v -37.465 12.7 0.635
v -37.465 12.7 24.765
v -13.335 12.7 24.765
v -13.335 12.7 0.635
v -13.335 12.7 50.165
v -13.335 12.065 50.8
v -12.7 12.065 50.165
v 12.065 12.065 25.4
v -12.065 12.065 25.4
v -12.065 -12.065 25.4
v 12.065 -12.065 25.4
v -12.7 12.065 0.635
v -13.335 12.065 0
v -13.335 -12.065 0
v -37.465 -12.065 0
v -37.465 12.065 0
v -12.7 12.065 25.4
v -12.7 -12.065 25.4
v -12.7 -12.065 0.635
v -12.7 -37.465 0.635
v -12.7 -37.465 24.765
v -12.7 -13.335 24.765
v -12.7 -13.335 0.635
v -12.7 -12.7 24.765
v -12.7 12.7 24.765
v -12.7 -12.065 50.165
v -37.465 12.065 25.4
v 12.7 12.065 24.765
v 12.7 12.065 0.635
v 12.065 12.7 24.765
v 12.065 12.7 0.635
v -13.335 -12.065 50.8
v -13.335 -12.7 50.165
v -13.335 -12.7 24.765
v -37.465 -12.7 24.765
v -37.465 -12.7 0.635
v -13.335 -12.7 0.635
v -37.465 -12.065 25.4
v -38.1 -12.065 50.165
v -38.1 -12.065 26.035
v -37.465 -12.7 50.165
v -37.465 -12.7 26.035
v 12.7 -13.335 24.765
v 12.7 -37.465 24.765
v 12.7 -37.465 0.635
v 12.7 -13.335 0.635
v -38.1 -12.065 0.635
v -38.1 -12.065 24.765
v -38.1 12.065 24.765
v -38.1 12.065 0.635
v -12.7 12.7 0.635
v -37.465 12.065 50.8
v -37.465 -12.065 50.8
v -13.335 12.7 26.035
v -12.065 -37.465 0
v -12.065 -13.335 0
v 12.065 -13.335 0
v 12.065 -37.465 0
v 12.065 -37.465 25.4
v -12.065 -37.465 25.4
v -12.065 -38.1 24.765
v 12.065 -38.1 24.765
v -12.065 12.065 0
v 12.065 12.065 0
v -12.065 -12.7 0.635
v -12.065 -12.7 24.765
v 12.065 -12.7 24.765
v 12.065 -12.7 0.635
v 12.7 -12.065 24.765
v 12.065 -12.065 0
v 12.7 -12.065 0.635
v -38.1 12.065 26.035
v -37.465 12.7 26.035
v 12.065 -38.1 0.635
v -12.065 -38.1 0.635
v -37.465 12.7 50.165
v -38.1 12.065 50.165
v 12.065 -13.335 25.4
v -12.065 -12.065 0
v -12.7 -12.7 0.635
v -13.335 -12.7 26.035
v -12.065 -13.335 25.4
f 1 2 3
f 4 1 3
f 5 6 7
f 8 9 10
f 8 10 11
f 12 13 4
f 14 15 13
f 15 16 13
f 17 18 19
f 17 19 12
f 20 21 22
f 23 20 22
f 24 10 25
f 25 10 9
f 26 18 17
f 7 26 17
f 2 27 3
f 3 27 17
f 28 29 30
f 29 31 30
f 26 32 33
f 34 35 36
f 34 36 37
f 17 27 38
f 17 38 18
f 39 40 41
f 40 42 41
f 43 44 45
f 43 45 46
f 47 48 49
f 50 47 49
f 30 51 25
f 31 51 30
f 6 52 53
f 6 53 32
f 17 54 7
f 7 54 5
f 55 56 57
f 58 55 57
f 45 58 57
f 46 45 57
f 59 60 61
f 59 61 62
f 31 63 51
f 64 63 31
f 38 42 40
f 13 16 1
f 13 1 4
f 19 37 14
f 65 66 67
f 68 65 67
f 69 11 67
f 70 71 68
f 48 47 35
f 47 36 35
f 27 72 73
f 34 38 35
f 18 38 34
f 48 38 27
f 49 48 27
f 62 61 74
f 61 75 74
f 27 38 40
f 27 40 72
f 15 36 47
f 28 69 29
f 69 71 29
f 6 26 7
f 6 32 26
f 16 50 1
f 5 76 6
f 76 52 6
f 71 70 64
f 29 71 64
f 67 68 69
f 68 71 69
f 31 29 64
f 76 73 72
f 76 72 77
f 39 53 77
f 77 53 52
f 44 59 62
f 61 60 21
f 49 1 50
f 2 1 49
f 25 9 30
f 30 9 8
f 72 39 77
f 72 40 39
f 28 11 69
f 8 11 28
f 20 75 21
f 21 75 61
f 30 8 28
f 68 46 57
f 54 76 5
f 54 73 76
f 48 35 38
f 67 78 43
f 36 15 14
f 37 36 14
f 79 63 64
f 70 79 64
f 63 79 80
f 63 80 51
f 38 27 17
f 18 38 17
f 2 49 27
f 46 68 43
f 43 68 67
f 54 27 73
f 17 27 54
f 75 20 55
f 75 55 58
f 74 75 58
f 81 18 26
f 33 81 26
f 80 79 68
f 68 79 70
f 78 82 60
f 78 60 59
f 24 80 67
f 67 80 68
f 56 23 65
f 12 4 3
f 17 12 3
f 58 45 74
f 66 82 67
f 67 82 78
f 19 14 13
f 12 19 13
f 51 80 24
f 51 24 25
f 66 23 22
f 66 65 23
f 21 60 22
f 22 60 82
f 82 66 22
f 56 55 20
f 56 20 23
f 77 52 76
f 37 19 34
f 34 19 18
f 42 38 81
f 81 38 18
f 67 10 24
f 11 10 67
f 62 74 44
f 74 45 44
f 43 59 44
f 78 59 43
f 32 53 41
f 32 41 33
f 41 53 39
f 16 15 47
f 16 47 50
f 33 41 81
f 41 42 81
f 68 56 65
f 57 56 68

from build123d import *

# Parameters (mm, degrees)
F0_W      = 25.4
F0_H      = 25.4
F1_DEPTH  = 25.4
F2_DEPTH  = 25.4
F3_DEPTH  = 25.4
F4_DEPTH  = 25.4
F5_SIZE   = 0.635
F5_2_SIZE = 0.635
F5_3_SIZE = 0.635
F5_4_SIZE = 0.635


with BuildPart() as f1:
    # F0 (on Top) → F1 (new body)
    with BuildSketch(Plane.XY):
        with Locations((-25.4, 0)):
            Rectangle(F0_W, F0_H)
    extrude(amount=F1_DEPTH)


with BuildPart() as f2:
    # F0 (on Top) → F2 (new body)
    with BuildSketch(Plane.XY):
        Rectangle(F0_W, F0_H)
    extrude(amount=F2_DEPTH)

    # F5#4
    f5_4_edges = [f2.edges().sort_by_distance(p)[0] for p in [
        (0, 12.7, 25.4),
        (-12.7, 0, 25.4),
        (0, -12.7, 25.4),
        (12.7, 0, 25.4),
        (12.7, -12.7, 12.7),
        (12.7, 12.7, 12.7),
        (12.7, 0, 0),
        (0, 12.7, 0),
        (-12.7, 0, 0),
        (0, -12.7, 0),
    ]]
    chamfer(f5_4_edges, length=F5_4_SIZE)


with BuildPart() as f3:
    # F0 (on Top) → F3 (new body)
    with BuildSketch(Plane.XY):
        with Locations((0, -25.4)):
            Rectangle(F0_W, F0_H)
    extrude(amount=F3_DEPTH)

    # F5#3
    f5_3_edges = [f3.edges().sort_by_distance(p)[0] for p in [
        (-12.7, -12.7, 12.7),
        (0, -12.7, 25.4),
        (-12.7, -25.4, 25.4),
        (0, -38.1, 25.4),
        (12.7, -25.4, 25.4),
        (-12.7, -38.1, 12.7),
        (-12.7, -25.4, 0),
        (12.7, -38.1, 12.7),
        (12.7, -12.7, 12.7),
        (12.7, -25.4, 0),
        (0, -12.7, 0),
        (0, -38.1, 0),
    ]]
    chamfer(f5_3_edges, length=F5_3_SIZE)


with BuildPart() as f4:
    # F4 (new): a face of the model
    f4_faces = [f1.part.faces().sort_by_distance(p)[0] for p in [
        (-25.4, 0, 25.4),
    ]]
    extrude(f4_faces, amount=F4_DEPTH)

    # F5
    f5_edges = [f4.edges().sort_by_distance(p)[0] for p in [
        (-12.7, 0, 50.8),
        (-25.4, 12.7, 50.8),
        (-38.1, 0, 50.8),
        (-25.4, -12.7, 50.8),
        (-38.1, -12.7, 38.1),
        (-12.7, -12.7, 38.1),
        (-25.4, -12.7, 25.4),
        (-38.1, 0, 25.4),
        (-38.1, 12.7, 38.1),
        (-25.4, 12.7, 25.4),
        (-12.7, 12.7, 38.1),
    ]]
    chamfer(f5_edges, length=F5_SIZE)


with BuildPart() as f1_1:
    add(f1.part)

    # F5#2
    f5_2_edges = [f1_1.edges().sort_by_distance(p)[0] for p in [
        (-25.4, -12.7, 25.4),
        (-38.1, -12.7, 12.7),
        (-12.7, -12.7, 12.7),
        (-25.4, -12.7, 0),
        (-38.1, 12.7, 12.7),
        (-38.1, 0, 0),
        (-38.1, 0, 25.4),
        (-12.7, 0, 0),
        (-25.4, 12.7, 0),
        (-12.7, 12.7, 12.7),
        (-25.4, 12.7, 25.4),
    ]]
    chamfer(f5_2_edges, length=F5_2_SIZE)


solid = Compound([f2.part, f3.part, f4.part, f1_1.part])
